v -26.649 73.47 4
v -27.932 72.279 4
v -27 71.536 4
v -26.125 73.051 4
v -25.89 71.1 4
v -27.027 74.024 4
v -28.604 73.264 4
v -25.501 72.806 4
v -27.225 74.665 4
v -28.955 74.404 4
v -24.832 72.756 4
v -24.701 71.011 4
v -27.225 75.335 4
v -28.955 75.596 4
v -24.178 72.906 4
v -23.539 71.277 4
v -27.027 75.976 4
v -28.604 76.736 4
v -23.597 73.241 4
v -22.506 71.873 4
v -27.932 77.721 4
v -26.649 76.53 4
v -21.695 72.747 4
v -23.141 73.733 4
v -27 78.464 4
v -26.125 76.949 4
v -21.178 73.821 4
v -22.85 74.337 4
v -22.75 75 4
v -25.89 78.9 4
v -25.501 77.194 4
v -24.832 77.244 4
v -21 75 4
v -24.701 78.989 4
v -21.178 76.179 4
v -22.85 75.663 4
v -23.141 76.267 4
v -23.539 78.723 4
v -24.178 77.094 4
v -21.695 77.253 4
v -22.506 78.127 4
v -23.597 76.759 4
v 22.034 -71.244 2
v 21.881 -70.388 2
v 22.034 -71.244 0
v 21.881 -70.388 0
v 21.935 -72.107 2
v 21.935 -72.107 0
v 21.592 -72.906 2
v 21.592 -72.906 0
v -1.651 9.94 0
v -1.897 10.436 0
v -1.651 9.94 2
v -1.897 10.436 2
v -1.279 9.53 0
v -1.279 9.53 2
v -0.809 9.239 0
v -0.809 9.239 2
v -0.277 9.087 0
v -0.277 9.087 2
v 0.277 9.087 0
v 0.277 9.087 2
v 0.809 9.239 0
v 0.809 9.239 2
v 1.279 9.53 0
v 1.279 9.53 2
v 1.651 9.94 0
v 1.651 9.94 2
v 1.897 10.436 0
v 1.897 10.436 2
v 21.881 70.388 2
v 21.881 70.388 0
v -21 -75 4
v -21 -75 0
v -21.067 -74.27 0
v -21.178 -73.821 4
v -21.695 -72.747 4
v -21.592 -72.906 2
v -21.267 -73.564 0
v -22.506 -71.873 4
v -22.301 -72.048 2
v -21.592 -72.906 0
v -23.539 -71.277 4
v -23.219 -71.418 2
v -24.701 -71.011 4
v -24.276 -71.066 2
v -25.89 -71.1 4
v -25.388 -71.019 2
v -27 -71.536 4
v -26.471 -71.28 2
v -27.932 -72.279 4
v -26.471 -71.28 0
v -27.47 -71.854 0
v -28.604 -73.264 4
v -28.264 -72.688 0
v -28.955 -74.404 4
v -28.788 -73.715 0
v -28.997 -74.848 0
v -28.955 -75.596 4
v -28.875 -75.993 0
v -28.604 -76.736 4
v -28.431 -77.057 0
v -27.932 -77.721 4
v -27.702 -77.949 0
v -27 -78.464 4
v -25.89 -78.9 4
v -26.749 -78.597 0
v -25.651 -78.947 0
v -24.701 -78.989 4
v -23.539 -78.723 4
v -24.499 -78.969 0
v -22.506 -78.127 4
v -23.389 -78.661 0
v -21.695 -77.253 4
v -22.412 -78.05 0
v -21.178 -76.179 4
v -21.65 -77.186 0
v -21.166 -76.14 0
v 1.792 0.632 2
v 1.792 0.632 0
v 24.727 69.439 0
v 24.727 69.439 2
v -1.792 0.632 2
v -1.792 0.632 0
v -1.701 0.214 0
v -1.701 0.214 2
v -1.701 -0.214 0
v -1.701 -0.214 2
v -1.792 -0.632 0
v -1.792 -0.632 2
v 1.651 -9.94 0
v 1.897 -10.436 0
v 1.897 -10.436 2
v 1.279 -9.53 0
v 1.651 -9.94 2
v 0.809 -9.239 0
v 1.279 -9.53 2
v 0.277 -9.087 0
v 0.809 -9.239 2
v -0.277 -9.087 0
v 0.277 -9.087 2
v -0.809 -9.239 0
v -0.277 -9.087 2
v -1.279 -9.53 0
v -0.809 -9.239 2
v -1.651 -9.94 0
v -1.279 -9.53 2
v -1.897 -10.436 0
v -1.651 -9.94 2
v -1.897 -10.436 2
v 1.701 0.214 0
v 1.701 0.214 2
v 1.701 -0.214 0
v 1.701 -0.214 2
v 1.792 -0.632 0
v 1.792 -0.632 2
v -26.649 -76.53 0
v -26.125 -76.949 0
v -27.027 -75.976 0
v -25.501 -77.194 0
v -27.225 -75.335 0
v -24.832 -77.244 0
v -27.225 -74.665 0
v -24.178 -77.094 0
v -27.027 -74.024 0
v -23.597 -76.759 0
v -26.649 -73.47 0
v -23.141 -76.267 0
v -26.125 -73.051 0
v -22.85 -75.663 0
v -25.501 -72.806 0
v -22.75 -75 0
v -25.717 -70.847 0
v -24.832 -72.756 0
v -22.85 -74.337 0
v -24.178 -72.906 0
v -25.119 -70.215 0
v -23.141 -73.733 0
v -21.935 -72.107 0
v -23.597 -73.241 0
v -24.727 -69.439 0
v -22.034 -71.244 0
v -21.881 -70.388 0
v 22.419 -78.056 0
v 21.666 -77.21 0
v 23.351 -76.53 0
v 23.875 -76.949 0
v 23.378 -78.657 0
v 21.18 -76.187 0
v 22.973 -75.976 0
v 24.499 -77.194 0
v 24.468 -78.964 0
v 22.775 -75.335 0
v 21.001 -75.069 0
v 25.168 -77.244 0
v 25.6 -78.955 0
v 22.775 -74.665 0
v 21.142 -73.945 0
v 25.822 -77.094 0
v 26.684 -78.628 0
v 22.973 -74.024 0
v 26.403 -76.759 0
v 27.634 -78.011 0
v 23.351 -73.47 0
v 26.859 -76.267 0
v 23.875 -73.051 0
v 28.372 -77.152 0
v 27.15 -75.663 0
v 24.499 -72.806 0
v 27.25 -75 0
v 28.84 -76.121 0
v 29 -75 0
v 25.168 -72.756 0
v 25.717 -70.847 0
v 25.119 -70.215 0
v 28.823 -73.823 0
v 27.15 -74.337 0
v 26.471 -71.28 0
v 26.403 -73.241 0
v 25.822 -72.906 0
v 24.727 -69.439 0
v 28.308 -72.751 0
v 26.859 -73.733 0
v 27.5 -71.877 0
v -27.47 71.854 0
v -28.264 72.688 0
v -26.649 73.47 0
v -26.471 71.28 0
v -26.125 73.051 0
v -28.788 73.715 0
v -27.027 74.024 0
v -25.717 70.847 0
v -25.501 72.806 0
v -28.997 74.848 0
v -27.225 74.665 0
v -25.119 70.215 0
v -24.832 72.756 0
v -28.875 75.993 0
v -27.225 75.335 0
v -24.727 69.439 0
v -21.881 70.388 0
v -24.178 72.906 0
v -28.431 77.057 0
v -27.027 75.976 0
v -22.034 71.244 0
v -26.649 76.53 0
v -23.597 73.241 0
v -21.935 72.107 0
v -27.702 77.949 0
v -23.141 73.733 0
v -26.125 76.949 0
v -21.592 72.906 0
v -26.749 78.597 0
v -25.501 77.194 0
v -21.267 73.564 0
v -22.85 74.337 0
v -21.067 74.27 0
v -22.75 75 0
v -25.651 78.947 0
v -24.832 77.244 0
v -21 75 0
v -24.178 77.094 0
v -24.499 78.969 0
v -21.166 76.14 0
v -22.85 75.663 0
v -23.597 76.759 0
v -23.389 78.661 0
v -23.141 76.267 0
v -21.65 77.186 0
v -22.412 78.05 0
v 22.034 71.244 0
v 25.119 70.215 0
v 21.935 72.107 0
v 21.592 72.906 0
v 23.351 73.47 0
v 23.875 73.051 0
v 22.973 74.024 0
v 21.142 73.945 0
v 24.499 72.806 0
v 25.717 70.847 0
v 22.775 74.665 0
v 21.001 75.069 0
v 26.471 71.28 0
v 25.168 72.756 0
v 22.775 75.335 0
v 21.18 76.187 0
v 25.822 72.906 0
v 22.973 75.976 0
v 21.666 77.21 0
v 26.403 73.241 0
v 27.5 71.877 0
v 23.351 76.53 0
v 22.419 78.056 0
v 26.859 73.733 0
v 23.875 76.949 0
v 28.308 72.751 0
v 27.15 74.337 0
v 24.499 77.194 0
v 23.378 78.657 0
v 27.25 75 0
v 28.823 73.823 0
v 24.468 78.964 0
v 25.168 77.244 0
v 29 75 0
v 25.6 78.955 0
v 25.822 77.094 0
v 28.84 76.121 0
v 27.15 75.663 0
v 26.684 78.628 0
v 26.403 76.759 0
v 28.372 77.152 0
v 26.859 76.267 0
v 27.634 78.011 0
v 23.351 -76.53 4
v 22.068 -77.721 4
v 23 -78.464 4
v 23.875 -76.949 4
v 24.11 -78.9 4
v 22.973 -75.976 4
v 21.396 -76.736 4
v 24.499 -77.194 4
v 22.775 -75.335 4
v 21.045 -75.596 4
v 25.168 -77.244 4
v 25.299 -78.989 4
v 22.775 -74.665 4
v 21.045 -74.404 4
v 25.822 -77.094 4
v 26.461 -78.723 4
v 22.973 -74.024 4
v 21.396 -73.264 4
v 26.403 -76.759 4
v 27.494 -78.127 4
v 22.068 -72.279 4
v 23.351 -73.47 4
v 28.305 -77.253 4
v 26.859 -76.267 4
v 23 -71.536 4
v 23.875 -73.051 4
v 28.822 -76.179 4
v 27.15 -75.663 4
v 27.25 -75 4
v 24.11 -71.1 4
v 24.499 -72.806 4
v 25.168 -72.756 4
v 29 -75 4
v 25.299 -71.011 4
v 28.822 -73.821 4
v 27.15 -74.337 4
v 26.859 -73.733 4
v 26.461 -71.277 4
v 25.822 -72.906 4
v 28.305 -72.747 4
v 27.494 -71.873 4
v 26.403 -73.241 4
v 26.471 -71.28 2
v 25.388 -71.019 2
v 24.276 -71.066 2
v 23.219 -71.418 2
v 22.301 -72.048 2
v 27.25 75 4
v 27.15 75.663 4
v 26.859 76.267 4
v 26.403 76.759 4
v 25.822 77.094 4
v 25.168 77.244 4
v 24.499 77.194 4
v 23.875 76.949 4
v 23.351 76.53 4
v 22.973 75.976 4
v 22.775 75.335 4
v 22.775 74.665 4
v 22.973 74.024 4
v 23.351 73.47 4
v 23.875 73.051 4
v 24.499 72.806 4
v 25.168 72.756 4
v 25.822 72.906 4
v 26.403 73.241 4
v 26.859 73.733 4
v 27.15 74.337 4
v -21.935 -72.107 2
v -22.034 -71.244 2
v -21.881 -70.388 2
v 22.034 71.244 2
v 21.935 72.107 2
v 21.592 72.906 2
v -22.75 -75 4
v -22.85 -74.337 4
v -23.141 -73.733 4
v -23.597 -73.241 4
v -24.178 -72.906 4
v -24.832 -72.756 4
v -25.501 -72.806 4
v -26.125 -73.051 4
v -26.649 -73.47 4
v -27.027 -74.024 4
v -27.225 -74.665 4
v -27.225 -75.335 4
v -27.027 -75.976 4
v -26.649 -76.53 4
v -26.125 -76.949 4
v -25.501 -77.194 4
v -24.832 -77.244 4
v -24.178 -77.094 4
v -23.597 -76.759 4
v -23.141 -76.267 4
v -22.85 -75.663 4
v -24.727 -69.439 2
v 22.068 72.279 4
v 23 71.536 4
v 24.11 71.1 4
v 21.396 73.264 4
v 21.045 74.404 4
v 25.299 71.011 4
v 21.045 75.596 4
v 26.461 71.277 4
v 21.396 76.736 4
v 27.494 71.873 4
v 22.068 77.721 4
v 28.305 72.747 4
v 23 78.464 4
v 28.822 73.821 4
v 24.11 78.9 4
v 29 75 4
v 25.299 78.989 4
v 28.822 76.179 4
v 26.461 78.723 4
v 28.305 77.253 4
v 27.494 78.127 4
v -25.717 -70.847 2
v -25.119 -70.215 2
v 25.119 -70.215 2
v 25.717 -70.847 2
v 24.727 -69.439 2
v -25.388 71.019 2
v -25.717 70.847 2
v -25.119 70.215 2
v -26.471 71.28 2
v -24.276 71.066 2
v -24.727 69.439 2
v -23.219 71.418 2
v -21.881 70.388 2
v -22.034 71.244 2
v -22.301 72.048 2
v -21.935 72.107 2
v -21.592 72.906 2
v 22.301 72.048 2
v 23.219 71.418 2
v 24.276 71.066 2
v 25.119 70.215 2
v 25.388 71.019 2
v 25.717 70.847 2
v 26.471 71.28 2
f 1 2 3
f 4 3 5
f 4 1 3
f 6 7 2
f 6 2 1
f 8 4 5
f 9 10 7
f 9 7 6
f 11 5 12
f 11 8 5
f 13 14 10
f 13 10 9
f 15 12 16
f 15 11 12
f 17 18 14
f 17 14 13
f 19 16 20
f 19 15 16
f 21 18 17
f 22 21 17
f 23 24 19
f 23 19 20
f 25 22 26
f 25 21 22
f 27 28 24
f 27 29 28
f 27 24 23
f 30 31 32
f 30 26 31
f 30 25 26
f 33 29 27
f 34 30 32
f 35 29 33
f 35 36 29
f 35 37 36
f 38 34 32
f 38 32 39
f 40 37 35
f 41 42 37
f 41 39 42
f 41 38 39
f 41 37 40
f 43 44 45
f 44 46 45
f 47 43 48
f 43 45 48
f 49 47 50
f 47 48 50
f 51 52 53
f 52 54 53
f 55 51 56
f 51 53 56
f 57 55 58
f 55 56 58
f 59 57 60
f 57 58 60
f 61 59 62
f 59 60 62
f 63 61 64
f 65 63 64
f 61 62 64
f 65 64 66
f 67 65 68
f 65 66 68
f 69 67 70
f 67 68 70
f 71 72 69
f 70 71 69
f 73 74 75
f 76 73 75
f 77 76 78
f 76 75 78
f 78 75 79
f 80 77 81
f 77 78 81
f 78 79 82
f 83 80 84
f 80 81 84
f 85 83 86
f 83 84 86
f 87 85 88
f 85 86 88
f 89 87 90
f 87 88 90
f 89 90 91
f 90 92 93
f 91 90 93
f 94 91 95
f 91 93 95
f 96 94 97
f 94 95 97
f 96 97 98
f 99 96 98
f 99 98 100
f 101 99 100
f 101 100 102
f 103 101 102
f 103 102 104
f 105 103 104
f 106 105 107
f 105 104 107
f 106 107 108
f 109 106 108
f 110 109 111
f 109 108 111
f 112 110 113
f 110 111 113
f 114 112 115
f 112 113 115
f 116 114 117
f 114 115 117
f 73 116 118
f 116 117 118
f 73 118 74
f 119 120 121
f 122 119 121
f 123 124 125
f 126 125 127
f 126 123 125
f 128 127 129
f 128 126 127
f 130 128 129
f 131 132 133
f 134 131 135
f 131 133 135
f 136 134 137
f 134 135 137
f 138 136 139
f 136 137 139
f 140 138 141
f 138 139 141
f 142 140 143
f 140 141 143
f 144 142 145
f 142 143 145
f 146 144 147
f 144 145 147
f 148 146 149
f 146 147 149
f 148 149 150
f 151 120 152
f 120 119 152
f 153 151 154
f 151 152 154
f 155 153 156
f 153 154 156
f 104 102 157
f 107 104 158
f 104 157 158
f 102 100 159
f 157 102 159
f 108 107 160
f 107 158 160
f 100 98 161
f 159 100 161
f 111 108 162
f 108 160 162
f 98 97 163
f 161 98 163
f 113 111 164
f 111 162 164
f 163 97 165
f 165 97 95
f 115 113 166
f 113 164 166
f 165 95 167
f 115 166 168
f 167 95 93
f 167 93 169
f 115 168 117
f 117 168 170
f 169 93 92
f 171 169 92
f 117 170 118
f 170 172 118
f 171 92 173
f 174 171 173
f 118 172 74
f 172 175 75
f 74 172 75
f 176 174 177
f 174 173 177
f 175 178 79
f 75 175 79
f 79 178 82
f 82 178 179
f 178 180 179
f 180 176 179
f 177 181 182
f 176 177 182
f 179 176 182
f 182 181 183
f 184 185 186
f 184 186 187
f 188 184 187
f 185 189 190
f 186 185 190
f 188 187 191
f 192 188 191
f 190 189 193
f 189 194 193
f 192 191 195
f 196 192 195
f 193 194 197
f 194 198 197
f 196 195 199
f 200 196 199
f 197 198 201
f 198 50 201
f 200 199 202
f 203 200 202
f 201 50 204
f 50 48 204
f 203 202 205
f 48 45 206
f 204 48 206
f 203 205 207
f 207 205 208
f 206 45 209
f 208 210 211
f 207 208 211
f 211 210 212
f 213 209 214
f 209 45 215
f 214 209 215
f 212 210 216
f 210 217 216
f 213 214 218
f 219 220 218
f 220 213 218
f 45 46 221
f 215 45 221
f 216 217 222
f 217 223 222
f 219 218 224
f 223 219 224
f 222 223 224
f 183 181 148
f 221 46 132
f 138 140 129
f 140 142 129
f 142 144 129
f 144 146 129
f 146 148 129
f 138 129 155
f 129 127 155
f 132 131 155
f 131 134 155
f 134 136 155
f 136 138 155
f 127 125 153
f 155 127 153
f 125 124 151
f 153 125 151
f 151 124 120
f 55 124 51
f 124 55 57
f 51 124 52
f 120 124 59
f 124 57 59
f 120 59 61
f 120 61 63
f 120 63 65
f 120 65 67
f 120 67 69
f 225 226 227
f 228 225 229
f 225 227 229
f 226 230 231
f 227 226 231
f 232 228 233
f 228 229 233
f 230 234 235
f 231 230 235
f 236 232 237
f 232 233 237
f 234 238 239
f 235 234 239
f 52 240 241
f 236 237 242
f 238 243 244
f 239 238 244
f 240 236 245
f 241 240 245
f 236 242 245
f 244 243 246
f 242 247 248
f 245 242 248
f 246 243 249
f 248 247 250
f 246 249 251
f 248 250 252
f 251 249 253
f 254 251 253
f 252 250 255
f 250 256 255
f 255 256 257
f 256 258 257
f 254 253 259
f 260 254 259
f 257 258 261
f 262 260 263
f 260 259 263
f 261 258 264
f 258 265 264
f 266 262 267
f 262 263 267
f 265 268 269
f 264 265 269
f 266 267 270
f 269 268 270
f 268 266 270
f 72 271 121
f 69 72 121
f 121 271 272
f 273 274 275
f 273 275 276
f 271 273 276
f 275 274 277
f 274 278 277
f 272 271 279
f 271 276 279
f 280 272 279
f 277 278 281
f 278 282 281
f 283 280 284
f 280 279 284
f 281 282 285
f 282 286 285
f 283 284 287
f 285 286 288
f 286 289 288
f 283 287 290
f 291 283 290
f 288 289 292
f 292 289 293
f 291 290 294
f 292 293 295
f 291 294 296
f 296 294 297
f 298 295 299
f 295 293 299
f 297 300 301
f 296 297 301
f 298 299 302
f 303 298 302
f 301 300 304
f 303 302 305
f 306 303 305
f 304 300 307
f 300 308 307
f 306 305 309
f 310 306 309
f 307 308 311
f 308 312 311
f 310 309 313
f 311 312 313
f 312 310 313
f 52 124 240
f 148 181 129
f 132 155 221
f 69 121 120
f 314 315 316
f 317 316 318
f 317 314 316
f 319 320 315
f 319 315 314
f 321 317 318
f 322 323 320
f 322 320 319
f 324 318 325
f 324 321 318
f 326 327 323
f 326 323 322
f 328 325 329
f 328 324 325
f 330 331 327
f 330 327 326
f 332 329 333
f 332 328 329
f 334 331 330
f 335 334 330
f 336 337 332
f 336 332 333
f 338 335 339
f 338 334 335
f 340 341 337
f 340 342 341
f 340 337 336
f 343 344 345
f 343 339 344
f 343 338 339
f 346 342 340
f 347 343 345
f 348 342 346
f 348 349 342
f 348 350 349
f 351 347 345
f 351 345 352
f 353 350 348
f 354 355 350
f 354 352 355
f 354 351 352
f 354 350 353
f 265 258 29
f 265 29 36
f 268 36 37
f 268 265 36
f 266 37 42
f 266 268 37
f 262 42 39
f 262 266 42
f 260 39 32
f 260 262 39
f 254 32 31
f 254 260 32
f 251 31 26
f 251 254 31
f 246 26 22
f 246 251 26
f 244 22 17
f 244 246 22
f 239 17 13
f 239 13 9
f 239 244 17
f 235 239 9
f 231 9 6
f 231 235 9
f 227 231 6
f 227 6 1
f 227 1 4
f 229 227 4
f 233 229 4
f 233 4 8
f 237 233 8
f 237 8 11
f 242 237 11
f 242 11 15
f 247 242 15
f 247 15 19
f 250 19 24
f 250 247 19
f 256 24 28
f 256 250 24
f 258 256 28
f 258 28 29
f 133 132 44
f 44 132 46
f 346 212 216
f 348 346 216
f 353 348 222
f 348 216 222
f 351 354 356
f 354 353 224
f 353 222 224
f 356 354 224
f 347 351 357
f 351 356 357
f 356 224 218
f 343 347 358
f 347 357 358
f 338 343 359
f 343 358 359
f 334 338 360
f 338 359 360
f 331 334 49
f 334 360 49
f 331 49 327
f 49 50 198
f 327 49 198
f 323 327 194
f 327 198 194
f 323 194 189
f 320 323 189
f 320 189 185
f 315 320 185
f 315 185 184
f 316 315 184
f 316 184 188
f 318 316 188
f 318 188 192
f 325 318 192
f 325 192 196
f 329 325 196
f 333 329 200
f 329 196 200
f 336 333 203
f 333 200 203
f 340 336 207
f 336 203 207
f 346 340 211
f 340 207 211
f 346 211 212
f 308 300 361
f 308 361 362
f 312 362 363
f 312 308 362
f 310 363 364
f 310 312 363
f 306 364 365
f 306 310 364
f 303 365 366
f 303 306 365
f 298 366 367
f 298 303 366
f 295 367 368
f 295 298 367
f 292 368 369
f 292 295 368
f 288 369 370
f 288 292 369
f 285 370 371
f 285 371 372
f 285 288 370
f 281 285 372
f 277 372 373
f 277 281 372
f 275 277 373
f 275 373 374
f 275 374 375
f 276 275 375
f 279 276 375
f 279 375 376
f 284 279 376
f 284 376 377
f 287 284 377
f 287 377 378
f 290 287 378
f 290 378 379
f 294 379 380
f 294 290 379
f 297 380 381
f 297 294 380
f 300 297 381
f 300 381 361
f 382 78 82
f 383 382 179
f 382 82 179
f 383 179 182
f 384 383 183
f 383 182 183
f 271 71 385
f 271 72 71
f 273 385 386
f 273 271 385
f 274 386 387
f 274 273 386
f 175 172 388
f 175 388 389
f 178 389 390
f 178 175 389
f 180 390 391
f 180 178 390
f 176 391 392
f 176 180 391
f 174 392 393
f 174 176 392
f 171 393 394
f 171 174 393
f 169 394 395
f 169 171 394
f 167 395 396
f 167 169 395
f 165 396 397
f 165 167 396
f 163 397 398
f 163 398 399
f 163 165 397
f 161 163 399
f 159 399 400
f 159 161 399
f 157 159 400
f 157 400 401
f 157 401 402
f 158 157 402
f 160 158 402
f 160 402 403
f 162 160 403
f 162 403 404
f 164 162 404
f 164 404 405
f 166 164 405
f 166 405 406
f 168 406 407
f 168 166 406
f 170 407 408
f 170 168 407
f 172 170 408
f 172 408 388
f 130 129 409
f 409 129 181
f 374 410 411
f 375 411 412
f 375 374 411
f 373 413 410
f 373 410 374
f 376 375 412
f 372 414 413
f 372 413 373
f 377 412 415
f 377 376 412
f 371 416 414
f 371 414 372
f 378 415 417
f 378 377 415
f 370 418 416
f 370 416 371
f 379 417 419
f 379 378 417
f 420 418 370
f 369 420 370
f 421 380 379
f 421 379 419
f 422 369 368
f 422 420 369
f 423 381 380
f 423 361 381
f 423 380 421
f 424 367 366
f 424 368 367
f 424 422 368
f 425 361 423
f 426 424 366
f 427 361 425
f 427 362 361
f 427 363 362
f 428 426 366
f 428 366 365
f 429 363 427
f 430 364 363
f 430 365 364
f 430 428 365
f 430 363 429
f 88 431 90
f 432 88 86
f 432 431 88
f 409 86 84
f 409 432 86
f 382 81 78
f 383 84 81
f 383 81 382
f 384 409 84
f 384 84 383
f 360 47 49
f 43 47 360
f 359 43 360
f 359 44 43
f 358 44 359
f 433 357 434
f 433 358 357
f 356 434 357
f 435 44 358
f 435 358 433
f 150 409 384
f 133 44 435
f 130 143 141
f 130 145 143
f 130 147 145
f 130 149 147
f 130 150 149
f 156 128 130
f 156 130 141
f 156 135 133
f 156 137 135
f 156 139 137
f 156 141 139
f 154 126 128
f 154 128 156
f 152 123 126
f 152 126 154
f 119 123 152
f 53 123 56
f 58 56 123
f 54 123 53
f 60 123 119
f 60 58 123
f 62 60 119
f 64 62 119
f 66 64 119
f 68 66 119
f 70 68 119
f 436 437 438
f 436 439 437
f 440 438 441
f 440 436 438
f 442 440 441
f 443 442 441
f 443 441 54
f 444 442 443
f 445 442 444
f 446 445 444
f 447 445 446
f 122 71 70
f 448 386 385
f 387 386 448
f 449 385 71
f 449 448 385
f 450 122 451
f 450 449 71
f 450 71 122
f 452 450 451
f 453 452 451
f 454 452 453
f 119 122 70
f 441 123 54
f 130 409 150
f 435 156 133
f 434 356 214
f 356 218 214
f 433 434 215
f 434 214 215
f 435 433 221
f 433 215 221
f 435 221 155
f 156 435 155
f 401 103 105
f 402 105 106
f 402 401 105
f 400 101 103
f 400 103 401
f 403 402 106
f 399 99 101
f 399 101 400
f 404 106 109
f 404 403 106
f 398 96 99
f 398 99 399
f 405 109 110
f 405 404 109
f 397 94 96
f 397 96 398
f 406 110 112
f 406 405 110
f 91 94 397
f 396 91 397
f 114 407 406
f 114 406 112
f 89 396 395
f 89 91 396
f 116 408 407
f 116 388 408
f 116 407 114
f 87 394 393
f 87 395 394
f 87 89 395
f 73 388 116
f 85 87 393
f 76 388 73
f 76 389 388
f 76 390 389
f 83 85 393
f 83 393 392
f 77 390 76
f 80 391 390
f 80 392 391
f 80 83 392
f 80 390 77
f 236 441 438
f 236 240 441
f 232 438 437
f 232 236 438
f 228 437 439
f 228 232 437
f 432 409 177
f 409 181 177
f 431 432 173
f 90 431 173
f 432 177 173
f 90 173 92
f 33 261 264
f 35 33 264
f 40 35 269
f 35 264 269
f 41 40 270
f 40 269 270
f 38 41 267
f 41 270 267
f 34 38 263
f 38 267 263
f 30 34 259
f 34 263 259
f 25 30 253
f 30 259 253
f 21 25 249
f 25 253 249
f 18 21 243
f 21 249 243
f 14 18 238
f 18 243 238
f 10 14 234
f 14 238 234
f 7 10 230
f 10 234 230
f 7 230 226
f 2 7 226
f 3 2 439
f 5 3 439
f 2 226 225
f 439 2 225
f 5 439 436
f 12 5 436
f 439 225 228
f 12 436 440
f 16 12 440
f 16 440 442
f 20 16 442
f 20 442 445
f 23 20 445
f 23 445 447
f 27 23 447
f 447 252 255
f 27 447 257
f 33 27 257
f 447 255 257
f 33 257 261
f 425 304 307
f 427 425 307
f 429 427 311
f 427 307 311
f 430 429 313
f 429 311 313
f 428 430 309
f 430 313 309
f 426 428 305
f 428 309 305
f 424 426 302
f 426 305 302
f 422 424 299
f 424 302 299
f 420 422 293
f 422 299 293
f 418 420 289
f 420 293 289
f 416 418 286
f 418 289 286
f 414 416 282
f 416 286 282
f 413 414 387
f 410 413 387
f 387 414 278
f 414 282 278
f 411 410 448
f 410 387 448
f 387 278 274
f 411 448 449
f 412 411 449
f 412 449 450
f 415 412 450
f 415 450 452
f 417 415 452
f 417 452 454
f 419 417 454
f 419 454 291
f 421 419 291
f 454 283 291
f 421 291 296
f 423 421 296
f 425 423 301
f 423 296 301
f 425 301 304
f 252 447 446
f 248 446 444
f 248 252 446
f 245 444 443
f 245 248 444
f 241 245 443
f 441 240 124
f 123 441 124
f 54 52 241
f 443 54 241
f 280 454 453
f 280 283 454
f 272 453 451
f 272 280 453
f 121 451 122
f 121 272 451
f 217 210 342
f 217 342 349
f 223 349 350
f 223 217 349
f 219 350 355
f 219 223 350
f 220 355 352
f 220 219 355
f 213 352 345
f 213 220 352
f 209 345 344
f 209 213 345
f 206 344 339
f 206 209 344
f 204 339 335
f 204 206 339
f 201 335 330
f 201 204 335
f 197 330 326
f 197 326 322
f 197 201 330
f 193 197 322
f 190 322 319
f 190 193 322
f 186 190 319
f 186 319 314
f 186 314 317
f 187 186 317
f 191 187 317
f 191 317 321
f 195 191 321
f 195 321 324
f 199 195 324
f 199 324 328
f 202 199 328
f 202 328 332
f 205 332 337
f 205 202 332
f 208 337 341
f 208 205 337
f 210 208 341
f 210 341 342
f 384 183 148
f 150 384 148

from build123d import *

# Parameters (mm, degrees)
F0_R     = 4
F0_R_2   = 2.25
F1_DEPTH = 4
F3_DEPTH = 2
F5_R     = 2
F6_R     = 3


with BuildPart() as f1:
    # F0 (on Top) → F1 (new body)
    with BuildSketch(Plane.XY):
        with Locations((-25, 75)):
            Circle(F0_R)
        with Locations((-25, 75)):
            Circle(F0_R_2, mode=Mode.SUBTRACT)
    extrude(amount=F1_DEPTH)


with BuildPart() as f1b:
    # F0 (on Top) → F1, piece 2 (new body)
    with BuildSketch(Plane.XY):
        with Locations((25, 75)):
            Circle(F0_R)
        with Locations((25, 75)):
            Circle(F0_R_2, mode=Mode.SUBTRACT)
    extrude(amount=F1_DEPTH)


with BuildPart() as f1c:
    # F0 (on Top) → F1, piece 3 (new body)
    with BuildSketch(Plane.XY):
        with Locations((-25, -75)):
            Circle(F0_R)
        with Locations((-25, -75)):
            Circle(F0_R_2, mode=Mode.SUBTRACT)
    extrude(amount=F1_DEPTH)


with BuildPart() as f1d:
    # F0 (on Top) → F1, piece 4 (new body)
    with BuildSketch(Plane.XY):
        with Locations((25, -75)):
            Circle(F0_R)
        with Locations((25, -75)):
            Circle(F0_R_2, mode=Mode.SUBTRACT)
    extrude(amount=F1_DEPTH)


with BuildPart() as f3:
    # F2 (on Top) → F3 (new body)
    with BuildSketch(Plane.XY):
        Polygon((-22.6102852702, 72.5742723009), (-25.4563351644, 71.6255890028), (-1.5811388301, 0), (0, 4.7434164903), align=None)
        Polygon((0, 4.7434164903), (-1.5811388301, 0), (0, -4.7434164903), (1.5811388301, 0), align=None)
        Polygon((0, -4.7434164903), (-1.5811388301, 0), (-25.4563351644, -71.6255890028), (-22.6102852702, -72.5742723009), align=None)
        Polygon((1.5811388301, 0), (0, -4.7434164903), (22.6102852702, -72.5742723009), (25.4563351644, -71.6255890028), align=None)
        Polygon((22.6102852702, 72.5742723009), (0, 4.7434164903), (1.5811388301, 0), (25.4563351644, 71.6255890028), align=None)
    extrude(amount=F3_DEPTH)

    # F4: union F1d, F1c, F1b, F1
    add(f1d.part)
    add(f1c.part)
    add(f1b.part)
    add(f1.part)

    # F5
    f5_edges = [f3.edges().sort_by_distance(p)[0] for p in [
        (0, 4.743416, 1),
        (-1.581139, 0, 1),
        (0, -4.743416, 1),
        (1.581139, 0, 1),
    ]]
    fillet(f5_edges, radius=F5_R)

    # F6
    f6_edges = [f3.edges().sort_by_distance(p)[0] for p in [
        (-25.250421, 71.007847, 1),
        (-22.404371, 71.95653, 1),
        (25.250421, 71.007847, 1),
        (-22.404371, -71.95653, 1),
        (25.250421, -71.007847, 1),
        (22.404371, -71.95653, 1),
        (-25.250421, -71.007847, 1),
        (22.404371, 71.95653, 1),
    ]]
    fillet(f6_edges, radius=F6_R)


solid = f3.part
